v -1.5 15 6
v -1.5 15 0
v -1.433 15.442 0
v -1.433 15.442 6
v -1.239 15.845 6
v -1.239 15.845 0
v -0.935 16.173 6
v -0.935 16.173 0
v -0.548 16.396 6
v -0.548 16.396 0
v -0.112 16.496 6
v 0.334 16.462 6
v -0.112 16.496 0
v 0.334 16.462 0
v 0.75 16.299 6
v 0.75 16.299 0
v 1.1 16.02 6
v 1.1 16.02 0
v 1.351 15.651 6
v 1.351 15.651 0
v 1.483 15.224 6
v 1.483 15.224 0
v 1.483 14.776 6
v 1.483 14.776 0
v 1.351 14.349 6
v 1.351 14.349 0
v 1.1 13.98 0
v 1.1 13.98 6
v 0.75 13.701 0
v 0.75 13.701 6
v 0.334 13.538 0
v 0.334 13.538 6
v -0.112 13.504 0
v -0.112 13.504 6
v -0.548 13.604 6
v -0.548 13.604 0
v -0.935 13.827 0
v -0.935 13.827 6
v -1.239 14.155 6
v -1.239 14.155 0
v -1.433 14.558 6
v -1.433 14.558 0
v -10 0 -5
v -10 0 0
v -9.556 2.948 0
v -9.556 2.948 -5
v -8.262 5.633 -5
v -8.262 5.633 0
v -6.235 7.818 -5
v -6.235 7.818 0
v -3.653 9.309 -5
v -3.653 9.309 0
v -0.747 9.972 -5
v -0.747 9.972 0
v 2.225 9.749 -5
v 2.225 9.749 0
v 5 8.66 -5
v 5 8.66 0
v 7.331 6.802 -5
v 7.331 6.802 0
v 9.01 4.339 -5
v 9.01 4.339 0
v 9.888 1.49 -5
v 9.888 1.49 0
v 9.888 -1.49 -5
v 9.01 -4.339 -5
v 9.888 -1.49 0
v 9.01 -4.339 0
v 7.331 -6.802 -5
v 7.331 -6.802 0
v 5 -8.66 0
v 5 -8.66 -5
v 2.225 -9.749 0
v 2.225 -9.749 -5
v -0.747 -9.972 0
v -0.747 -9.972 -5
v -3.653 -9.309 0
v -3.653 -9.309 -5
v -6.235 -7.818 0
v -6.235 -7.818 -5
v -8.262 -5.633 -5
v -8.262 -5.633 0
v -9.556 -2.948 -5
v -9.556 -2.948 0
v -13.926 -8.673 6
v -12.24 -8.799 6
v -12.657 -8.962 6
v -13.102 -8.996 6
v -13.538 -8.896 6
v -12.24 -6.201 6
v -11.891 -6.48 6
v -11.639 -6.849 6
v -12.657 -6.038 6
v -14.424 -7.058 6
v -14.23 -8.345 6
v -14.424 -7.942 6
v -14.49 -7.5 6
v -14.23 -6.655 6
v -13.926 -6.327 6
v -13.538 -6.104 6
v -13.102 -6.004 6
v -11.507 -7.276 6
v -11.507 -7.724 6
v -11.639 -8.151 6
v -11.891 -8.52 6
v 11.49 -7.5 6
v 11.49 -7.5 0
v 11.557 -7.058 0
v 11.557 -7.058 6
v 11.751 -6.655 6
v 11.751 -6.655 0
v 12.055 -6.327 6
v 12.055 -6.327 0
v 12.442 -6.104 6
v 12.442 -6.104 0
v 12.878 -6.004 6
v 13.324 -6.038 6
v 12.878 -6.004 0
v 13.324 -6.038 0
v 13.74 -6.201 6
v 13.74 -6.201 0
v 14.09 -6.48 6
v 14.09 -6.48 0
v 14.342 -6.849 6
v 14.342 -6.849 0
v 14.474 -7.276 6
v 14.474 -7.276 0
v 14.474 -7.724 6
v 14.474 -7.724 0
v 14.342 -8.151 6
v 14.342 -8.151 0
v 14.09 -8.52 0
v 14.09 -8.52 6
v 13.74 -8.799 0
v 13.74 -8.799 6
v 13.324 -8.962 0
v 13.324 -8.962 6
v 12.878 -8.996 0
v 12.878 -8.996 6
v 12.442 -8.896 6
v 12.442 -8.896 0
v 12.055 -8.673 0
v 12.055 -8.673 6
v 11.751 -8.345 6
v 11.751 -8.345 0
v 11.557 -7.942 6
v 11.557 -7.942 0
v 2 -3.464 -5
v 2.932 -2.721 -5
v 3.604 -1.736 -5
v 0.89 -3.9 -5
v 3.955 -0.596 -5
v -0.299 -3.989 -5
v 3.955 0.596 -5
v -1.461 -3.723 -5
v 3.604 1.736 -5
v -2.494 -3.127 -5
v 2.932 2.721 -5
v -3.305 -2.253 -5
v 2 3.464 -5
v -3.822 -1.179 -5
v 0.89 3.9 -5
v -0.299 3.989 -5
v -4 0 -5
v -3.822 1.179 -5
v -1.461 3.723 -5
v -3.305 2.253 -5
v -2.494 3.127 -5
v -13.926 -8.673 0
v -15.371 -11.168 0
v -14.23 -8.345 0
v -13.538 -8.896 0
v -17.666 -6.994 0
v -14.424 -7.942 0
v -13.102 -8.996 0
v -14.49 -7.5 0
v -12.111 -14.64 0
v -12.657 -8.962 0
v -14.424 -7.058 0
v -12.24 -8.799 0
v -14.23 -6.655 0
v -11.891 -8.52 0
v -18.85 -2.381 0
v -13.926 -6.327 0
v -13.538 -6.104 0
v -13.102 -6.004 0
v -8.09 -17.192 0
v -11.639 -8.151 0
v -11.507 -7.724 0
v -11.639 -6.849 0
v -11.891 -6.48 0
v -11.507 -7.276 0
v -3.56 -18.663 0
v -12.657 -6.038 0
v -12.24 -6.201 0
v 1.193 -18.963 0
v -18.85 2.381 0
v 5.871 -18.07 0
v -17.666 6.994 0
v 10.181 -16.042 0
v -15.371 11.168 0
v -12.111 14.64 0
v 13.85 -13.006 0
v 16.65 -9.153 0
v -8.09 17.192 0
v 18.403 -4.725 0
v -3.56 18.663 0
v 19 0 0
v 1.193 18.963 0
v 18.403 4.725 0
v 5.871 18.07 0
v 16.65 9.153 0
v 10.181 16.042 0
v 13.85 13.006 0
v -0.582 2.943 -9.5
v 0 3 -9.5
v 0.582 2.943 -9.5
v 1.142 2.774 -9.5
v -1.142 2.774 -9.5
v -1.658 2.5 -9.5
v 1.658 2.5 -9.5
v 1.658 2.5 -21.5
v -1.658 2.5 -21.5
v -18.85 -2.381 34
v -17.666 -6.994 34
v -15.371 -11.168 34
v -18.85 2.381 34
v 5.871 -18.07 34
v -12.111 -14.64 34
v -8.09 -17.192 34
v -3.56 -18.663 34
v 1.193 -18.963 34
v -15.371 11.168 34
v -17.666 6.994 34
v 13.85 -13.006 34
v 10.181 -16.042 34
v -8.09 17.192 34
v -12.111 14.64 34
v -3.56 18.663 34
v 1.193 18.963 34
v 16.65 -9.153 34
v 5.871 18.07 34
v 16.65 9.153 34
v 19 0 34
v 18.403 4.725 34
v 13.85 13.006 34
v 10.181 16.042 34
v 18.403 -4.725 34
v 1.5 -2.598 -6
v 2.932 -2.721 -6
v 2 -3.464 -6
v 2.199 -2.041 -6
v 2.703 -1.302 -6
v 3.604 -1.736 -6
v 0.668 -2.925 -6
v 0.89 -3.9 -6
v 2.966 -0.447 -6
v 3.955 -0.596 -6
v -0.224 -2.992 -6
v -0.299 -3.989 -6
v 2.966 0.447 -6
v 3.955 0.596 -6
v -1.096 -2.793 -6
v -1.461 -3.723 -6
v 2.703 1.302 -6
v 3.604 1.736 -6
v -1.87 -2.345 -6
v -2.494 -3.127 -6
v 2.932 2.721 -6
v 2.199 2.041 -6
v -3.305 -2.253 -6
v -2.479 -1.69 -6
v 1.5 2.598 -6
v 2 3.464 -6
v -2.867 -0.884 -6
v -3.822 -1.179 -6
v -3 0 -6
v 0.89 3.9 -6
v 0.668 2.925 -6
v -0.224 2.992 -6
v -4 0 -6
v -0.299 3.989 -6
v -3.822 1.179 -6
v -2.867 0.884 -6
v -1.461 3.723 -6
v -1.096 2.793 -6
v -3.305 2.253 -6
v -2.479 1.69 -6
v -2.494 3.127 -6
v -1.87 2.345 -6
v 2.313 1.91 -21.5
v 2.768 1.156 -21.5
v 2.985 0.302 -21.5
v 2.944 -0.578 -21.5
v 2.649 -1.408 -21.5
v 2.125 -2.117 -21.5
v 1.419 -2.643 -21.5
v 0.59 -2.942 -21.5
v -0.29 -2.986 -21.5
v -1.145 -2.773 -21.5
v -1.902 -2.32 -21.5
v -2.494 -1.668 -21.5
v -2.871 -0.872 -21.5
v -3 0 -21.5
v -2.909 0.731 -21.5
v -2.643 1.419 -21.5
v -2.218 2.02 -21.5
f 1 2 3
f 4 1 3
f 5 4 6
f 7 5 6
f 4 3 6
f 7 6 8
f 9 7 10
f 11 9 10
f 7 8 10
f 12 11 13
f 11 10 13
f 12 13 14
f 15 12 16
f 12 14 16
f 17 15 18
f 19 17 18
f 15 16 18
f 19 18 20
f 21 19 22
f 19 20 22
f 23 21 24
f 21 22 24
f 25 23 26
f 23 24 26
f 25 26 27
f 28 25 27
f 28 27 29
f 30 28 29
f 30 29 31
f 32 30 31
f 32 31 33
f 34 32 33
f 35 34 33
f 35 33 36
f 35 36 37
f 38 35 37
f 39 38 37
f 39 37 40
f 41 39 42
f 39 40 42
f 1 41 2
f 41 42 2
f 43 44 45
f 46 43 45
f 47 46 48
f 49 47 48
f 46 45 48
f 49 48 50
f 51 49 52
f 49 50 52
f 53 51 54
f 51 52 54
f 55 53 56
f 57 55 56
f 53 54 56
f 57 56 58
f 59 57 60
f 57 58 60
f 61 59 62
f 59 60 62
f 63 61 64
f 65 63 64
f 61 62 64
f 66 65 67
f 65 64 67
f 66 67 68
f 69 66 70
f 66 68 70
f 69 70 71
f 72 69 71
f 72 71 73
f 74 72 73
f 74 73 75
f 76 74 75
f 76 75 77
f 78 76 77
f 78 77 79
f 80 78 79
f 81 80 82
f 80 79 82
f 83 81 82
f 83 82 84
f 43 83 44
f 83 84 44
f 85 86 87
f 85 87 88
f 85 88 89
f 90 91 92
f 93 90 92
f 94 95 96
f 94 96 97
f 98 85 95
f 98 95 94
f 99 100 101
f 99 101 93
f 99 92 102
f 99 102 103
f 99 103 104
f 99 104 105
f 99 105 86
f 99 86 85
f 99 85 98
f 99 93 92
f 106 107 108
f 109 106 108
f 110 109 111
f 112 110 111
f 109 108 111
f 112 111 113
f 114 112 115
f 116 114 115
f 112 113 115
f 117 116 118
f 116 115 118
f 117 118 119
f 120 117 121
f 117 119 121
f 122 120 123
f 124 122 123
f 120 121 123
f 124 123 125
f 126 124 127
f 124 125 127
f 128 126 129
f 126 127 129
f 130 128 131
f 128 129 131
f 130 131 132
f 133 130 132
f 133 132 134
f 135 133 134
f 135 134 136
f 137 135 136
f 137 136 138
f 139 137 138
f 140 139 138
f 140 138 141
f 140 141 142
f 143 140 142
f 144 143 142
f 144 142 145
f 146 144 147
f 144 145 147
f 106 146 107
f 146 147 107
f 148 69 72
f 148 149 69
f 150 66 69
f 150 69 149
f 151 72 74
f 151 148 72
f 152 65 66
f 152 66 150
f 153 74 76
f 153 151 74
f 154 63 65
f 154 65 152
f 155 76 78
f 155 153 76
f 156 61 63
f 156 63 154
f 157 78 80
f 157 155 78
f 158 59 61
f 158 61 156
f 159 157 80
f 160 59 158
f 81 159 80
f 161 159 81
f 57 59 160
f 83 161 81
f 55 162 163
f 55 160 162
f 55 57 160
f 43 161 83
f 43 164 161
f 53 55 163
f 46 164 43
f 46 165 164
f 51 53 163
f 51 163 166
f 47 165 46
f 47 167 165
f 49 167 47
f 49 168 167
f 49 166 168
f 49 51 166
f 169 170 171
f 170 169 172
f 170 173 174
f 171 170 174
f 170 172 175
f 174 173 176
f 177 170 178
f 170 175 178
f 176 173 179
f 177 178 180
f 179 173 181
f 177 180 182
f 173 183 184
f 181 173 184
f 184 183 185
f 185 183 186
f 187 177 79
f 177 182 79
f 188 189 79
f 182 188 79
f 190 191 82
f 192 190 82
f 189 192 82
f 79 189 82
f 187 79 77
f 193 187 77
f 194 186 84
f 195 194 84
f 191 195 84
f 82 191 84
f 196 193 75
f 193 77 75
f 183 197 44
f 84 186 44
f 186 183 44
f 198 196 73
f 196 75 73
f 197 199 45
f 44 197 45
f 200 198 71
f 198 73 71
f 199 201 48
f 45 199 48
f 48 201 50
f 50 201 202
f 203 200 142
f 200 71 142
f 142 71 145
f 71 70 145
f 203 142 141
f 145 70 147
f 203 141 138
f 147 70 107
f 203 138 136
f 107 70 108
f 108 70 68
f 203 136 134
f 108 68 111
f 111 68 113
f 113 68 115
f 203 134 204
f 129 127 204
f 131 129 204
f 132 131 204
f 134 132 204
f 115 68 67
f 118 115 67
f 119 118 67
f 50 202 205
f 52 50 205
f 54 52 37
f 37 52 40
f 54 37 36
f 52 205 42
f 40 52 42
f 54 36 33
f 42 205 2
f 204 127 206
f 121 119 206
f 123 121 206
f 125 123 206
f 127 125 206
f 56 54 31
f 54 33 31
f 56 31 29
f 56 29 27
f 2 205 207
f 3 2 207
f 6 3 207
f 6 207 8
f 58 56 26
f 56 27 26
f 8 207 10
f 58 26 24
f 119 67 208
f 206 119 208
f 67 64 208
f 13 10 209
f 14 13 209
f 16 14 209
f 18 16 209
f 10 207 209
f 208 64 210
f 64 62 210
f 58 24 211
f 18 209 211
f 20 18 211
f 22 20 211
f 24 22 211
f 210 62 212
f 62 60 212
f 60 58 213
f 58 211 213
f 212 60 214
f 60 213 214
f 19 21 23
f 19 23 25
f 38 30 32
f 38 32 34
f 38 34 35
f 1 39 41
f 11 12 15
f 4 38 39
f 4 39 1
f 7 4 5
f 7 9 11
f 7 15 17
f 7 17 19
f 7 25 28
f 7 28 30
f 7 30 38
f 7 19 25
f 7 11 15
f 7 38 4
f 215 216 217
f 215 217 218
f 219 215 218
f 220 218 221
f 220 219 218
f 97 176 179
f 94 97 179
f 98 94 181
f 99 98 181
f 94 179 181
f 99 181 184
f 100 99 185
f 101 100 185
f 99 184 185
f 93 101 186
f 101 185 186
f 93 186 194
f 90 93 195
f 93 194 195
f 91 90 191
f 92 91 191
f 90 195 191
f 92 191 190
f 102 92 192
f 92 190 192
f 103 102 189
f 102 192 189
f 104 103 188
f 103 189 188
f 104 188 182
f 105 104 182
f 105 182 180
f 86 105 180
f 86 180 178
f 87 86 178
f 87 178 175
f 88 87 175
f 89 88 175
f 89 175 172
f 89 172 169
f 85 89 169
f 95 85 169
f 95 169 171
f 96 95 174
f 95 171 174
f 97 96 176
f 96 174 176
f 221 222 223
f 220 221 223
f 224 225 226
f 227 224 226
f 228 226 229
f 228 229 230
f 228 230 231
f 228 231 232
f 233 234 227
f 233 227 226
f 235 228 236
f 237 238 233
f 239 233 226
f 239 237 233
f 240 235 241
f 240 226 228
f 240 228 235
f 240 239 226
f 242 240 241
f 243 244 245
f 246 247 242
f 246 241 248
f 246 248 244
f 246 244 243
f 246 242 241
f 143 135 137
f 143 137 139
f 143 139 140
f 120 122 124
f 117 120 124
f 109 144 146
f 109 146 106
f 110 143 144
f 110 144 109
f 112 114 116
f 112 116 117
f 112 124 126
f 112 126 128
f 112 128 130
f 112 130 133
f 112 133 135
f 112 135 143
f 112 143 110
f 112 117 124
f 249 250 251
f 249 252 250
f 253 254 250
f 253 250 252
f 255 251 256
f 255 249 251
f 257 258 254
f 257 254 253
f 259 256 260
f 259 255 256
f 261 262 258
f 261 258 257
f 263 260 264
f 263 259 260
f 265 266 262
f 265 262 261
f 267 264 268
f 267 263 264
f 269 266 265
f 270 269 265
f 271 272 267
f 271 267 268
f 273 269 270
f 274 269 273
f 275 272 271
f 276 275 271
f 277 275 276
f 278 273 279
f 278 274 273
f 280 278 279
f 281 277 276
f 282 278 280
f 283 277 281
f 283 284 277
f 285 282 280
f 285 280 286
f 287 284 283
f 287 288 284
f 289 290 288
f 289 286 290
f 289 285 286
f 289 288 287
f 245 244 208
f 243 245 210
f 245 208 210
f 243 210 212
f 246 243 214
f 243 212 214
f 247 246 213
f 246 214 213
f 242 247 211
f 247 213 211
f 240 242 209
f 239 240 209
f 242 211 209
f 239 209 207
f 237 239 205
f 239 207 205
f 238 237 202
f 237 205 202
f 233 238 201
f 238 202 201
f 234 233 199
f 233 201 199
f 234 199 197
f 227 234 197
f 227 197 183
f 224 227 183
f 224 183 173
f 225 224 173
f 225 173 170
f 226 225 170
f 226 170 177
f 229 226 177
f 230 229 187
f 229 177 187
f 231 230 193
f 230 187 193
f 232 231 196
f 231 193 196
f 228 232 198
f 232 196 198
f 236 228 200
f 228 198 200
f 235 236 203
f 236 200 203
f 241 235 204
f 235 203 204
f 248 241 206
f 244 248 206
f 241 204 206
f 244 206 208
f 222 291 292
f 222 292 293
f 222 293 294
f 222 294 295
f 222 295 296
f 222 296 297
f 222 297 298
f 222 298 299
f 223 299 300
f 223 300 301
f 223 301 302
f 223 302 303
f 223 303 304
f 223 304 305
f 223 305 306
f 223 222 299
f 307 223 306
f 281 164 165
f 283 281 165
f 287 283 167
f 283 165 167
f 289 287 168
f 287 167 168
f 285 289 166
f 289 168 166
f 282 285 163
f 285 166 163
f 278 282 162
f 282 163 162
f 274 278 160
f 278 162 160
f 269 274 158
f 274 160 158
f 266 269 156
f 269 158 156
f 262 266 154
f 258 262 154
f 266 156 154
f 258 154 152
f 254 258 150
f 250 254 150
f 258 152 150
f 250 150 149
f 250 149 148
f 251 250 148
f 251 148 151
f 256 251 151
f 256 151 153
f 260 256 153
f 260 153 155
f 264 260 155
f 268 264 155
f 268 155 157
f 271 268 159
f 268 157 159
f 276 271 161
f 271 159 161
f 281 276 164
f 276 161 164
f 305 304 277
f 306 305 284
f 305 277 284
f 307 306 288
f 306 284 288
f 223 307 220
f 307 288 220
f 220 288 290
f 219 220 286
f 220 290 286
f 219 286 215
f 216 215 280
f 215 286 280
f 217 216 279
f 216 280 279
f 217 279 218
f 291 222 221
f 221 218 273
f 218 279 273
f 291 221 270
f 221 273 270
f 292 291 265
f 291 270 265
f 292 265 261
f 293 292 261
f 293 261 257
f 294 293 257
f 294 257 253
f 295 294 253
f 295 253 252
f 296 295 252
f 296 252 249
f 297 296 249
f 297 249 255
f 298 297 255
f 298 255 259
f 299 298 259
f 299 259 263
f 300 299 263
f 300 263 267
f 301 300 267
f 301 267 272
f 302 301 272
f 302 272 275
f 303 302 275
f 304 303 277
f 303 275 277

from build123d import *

# Parameters (mm, degrees)
SKETCH_1_R          = 19
EXTRUDE_1_DEPTH     = 34
SKETCH_2_R          = 10
EXTRUDE_2_DEPTH     = 5
SKETCH_3_R          = 4
EXTRUDE_3_DEPTH     = 1
SKETCH_4_R          = 3
EXTRUDE_4_DEPTH     = 15.5
CUT_EXTRUDE_2_DEPTH = 12
SKETCH_7_R          = 1.5
CUT_EXTRUDE_3_DEPTH = 6


with BuildPart() as part:
    # 草图1 → 凸台-拉伸1 (new body)
    with BuildSketch(Plane.XY):
        Circle(SKETCH_1_R)
    extrude(amount=EXTRUDE_1_DEPTH)

    # 草图2 → 凸台-拉伸2 (add)
    with BuildSketch(Plane(origin=(0, 0, 0), x_dir=(-1, 0, 0), z_dir=(0, 0, -1))):
        Circle(SKETCH_2_R)
    extrude(amount=EXTRUDE_2_DEPTH)

    # 草图3 → 凸台-拉伸3 (add)
    with BuildSketch(Plane(origin=(0, 0, -5), x_dir=(-1, 0, 0), z_dir=(0, 0, -1))):
        Circle(SKETCH_3_R)
    extrude(amount=EXTRUDE_3_DEPTH)

    # 草图4 → 凸台-拉伸4 (add)
    with BuildSketch(Plane(origin=(0, 0, -6), x_dir=(-1, 0, 0), z_dir=(0, 0, -1))):
        Circle(SKETCH_4_R)
    extrude(amount=EXTRUDE_4_DEPTH)

    # 草图5 → 切除-拉伸2 (cut)
    with BuildSketch(Plane(origin=(0, 0, -21.5), x_dir=(-1, 0, 0), z_dir=(0, 0, -1))):
        with BuildLine():
            ThreePointArc((1.658312395, 2.5), (0.866025404, 2.872281323), (0, 3))
            Line((0, 3), (0, 2.5))
            Line((0, 2.5), (1.658312395, 2.5))
        make_face()
        with BuildLine():
            Line((0, 2.5), (0, 3))
            ThreePointArc((0, 3), (-0.866025404, 2.872281323), (-1.658312395, 2.5))
            Line((-1.658312395, 2.5), (0, 2.5))
        make_face()
    extrude(amount=-CUT_EXTRUDE_2_DEPTH, mode=Mode.SUBTRACT)

    # 草图7 → 切除-拉伸3 (cut)
    with BuildSketch(Plane(origin=(0, 0, 0), x_dir=(-1, 0, 0), z_dir=(0, 0, -1))):
        with Locations((0, 15)):
            Circle(SKETCH_7_R)
        with Locations((-12.990381057, -7.5)):
            Circle(SKETCH_7_R)
        with Locations((12.990381057, -7.5)):
            Circle(SKETCH_7_R)
    extrude(amount=-CUT_EXTRUDE_3_DEPTH, mode=Mode.SUBTRACT)


solid = part.part
